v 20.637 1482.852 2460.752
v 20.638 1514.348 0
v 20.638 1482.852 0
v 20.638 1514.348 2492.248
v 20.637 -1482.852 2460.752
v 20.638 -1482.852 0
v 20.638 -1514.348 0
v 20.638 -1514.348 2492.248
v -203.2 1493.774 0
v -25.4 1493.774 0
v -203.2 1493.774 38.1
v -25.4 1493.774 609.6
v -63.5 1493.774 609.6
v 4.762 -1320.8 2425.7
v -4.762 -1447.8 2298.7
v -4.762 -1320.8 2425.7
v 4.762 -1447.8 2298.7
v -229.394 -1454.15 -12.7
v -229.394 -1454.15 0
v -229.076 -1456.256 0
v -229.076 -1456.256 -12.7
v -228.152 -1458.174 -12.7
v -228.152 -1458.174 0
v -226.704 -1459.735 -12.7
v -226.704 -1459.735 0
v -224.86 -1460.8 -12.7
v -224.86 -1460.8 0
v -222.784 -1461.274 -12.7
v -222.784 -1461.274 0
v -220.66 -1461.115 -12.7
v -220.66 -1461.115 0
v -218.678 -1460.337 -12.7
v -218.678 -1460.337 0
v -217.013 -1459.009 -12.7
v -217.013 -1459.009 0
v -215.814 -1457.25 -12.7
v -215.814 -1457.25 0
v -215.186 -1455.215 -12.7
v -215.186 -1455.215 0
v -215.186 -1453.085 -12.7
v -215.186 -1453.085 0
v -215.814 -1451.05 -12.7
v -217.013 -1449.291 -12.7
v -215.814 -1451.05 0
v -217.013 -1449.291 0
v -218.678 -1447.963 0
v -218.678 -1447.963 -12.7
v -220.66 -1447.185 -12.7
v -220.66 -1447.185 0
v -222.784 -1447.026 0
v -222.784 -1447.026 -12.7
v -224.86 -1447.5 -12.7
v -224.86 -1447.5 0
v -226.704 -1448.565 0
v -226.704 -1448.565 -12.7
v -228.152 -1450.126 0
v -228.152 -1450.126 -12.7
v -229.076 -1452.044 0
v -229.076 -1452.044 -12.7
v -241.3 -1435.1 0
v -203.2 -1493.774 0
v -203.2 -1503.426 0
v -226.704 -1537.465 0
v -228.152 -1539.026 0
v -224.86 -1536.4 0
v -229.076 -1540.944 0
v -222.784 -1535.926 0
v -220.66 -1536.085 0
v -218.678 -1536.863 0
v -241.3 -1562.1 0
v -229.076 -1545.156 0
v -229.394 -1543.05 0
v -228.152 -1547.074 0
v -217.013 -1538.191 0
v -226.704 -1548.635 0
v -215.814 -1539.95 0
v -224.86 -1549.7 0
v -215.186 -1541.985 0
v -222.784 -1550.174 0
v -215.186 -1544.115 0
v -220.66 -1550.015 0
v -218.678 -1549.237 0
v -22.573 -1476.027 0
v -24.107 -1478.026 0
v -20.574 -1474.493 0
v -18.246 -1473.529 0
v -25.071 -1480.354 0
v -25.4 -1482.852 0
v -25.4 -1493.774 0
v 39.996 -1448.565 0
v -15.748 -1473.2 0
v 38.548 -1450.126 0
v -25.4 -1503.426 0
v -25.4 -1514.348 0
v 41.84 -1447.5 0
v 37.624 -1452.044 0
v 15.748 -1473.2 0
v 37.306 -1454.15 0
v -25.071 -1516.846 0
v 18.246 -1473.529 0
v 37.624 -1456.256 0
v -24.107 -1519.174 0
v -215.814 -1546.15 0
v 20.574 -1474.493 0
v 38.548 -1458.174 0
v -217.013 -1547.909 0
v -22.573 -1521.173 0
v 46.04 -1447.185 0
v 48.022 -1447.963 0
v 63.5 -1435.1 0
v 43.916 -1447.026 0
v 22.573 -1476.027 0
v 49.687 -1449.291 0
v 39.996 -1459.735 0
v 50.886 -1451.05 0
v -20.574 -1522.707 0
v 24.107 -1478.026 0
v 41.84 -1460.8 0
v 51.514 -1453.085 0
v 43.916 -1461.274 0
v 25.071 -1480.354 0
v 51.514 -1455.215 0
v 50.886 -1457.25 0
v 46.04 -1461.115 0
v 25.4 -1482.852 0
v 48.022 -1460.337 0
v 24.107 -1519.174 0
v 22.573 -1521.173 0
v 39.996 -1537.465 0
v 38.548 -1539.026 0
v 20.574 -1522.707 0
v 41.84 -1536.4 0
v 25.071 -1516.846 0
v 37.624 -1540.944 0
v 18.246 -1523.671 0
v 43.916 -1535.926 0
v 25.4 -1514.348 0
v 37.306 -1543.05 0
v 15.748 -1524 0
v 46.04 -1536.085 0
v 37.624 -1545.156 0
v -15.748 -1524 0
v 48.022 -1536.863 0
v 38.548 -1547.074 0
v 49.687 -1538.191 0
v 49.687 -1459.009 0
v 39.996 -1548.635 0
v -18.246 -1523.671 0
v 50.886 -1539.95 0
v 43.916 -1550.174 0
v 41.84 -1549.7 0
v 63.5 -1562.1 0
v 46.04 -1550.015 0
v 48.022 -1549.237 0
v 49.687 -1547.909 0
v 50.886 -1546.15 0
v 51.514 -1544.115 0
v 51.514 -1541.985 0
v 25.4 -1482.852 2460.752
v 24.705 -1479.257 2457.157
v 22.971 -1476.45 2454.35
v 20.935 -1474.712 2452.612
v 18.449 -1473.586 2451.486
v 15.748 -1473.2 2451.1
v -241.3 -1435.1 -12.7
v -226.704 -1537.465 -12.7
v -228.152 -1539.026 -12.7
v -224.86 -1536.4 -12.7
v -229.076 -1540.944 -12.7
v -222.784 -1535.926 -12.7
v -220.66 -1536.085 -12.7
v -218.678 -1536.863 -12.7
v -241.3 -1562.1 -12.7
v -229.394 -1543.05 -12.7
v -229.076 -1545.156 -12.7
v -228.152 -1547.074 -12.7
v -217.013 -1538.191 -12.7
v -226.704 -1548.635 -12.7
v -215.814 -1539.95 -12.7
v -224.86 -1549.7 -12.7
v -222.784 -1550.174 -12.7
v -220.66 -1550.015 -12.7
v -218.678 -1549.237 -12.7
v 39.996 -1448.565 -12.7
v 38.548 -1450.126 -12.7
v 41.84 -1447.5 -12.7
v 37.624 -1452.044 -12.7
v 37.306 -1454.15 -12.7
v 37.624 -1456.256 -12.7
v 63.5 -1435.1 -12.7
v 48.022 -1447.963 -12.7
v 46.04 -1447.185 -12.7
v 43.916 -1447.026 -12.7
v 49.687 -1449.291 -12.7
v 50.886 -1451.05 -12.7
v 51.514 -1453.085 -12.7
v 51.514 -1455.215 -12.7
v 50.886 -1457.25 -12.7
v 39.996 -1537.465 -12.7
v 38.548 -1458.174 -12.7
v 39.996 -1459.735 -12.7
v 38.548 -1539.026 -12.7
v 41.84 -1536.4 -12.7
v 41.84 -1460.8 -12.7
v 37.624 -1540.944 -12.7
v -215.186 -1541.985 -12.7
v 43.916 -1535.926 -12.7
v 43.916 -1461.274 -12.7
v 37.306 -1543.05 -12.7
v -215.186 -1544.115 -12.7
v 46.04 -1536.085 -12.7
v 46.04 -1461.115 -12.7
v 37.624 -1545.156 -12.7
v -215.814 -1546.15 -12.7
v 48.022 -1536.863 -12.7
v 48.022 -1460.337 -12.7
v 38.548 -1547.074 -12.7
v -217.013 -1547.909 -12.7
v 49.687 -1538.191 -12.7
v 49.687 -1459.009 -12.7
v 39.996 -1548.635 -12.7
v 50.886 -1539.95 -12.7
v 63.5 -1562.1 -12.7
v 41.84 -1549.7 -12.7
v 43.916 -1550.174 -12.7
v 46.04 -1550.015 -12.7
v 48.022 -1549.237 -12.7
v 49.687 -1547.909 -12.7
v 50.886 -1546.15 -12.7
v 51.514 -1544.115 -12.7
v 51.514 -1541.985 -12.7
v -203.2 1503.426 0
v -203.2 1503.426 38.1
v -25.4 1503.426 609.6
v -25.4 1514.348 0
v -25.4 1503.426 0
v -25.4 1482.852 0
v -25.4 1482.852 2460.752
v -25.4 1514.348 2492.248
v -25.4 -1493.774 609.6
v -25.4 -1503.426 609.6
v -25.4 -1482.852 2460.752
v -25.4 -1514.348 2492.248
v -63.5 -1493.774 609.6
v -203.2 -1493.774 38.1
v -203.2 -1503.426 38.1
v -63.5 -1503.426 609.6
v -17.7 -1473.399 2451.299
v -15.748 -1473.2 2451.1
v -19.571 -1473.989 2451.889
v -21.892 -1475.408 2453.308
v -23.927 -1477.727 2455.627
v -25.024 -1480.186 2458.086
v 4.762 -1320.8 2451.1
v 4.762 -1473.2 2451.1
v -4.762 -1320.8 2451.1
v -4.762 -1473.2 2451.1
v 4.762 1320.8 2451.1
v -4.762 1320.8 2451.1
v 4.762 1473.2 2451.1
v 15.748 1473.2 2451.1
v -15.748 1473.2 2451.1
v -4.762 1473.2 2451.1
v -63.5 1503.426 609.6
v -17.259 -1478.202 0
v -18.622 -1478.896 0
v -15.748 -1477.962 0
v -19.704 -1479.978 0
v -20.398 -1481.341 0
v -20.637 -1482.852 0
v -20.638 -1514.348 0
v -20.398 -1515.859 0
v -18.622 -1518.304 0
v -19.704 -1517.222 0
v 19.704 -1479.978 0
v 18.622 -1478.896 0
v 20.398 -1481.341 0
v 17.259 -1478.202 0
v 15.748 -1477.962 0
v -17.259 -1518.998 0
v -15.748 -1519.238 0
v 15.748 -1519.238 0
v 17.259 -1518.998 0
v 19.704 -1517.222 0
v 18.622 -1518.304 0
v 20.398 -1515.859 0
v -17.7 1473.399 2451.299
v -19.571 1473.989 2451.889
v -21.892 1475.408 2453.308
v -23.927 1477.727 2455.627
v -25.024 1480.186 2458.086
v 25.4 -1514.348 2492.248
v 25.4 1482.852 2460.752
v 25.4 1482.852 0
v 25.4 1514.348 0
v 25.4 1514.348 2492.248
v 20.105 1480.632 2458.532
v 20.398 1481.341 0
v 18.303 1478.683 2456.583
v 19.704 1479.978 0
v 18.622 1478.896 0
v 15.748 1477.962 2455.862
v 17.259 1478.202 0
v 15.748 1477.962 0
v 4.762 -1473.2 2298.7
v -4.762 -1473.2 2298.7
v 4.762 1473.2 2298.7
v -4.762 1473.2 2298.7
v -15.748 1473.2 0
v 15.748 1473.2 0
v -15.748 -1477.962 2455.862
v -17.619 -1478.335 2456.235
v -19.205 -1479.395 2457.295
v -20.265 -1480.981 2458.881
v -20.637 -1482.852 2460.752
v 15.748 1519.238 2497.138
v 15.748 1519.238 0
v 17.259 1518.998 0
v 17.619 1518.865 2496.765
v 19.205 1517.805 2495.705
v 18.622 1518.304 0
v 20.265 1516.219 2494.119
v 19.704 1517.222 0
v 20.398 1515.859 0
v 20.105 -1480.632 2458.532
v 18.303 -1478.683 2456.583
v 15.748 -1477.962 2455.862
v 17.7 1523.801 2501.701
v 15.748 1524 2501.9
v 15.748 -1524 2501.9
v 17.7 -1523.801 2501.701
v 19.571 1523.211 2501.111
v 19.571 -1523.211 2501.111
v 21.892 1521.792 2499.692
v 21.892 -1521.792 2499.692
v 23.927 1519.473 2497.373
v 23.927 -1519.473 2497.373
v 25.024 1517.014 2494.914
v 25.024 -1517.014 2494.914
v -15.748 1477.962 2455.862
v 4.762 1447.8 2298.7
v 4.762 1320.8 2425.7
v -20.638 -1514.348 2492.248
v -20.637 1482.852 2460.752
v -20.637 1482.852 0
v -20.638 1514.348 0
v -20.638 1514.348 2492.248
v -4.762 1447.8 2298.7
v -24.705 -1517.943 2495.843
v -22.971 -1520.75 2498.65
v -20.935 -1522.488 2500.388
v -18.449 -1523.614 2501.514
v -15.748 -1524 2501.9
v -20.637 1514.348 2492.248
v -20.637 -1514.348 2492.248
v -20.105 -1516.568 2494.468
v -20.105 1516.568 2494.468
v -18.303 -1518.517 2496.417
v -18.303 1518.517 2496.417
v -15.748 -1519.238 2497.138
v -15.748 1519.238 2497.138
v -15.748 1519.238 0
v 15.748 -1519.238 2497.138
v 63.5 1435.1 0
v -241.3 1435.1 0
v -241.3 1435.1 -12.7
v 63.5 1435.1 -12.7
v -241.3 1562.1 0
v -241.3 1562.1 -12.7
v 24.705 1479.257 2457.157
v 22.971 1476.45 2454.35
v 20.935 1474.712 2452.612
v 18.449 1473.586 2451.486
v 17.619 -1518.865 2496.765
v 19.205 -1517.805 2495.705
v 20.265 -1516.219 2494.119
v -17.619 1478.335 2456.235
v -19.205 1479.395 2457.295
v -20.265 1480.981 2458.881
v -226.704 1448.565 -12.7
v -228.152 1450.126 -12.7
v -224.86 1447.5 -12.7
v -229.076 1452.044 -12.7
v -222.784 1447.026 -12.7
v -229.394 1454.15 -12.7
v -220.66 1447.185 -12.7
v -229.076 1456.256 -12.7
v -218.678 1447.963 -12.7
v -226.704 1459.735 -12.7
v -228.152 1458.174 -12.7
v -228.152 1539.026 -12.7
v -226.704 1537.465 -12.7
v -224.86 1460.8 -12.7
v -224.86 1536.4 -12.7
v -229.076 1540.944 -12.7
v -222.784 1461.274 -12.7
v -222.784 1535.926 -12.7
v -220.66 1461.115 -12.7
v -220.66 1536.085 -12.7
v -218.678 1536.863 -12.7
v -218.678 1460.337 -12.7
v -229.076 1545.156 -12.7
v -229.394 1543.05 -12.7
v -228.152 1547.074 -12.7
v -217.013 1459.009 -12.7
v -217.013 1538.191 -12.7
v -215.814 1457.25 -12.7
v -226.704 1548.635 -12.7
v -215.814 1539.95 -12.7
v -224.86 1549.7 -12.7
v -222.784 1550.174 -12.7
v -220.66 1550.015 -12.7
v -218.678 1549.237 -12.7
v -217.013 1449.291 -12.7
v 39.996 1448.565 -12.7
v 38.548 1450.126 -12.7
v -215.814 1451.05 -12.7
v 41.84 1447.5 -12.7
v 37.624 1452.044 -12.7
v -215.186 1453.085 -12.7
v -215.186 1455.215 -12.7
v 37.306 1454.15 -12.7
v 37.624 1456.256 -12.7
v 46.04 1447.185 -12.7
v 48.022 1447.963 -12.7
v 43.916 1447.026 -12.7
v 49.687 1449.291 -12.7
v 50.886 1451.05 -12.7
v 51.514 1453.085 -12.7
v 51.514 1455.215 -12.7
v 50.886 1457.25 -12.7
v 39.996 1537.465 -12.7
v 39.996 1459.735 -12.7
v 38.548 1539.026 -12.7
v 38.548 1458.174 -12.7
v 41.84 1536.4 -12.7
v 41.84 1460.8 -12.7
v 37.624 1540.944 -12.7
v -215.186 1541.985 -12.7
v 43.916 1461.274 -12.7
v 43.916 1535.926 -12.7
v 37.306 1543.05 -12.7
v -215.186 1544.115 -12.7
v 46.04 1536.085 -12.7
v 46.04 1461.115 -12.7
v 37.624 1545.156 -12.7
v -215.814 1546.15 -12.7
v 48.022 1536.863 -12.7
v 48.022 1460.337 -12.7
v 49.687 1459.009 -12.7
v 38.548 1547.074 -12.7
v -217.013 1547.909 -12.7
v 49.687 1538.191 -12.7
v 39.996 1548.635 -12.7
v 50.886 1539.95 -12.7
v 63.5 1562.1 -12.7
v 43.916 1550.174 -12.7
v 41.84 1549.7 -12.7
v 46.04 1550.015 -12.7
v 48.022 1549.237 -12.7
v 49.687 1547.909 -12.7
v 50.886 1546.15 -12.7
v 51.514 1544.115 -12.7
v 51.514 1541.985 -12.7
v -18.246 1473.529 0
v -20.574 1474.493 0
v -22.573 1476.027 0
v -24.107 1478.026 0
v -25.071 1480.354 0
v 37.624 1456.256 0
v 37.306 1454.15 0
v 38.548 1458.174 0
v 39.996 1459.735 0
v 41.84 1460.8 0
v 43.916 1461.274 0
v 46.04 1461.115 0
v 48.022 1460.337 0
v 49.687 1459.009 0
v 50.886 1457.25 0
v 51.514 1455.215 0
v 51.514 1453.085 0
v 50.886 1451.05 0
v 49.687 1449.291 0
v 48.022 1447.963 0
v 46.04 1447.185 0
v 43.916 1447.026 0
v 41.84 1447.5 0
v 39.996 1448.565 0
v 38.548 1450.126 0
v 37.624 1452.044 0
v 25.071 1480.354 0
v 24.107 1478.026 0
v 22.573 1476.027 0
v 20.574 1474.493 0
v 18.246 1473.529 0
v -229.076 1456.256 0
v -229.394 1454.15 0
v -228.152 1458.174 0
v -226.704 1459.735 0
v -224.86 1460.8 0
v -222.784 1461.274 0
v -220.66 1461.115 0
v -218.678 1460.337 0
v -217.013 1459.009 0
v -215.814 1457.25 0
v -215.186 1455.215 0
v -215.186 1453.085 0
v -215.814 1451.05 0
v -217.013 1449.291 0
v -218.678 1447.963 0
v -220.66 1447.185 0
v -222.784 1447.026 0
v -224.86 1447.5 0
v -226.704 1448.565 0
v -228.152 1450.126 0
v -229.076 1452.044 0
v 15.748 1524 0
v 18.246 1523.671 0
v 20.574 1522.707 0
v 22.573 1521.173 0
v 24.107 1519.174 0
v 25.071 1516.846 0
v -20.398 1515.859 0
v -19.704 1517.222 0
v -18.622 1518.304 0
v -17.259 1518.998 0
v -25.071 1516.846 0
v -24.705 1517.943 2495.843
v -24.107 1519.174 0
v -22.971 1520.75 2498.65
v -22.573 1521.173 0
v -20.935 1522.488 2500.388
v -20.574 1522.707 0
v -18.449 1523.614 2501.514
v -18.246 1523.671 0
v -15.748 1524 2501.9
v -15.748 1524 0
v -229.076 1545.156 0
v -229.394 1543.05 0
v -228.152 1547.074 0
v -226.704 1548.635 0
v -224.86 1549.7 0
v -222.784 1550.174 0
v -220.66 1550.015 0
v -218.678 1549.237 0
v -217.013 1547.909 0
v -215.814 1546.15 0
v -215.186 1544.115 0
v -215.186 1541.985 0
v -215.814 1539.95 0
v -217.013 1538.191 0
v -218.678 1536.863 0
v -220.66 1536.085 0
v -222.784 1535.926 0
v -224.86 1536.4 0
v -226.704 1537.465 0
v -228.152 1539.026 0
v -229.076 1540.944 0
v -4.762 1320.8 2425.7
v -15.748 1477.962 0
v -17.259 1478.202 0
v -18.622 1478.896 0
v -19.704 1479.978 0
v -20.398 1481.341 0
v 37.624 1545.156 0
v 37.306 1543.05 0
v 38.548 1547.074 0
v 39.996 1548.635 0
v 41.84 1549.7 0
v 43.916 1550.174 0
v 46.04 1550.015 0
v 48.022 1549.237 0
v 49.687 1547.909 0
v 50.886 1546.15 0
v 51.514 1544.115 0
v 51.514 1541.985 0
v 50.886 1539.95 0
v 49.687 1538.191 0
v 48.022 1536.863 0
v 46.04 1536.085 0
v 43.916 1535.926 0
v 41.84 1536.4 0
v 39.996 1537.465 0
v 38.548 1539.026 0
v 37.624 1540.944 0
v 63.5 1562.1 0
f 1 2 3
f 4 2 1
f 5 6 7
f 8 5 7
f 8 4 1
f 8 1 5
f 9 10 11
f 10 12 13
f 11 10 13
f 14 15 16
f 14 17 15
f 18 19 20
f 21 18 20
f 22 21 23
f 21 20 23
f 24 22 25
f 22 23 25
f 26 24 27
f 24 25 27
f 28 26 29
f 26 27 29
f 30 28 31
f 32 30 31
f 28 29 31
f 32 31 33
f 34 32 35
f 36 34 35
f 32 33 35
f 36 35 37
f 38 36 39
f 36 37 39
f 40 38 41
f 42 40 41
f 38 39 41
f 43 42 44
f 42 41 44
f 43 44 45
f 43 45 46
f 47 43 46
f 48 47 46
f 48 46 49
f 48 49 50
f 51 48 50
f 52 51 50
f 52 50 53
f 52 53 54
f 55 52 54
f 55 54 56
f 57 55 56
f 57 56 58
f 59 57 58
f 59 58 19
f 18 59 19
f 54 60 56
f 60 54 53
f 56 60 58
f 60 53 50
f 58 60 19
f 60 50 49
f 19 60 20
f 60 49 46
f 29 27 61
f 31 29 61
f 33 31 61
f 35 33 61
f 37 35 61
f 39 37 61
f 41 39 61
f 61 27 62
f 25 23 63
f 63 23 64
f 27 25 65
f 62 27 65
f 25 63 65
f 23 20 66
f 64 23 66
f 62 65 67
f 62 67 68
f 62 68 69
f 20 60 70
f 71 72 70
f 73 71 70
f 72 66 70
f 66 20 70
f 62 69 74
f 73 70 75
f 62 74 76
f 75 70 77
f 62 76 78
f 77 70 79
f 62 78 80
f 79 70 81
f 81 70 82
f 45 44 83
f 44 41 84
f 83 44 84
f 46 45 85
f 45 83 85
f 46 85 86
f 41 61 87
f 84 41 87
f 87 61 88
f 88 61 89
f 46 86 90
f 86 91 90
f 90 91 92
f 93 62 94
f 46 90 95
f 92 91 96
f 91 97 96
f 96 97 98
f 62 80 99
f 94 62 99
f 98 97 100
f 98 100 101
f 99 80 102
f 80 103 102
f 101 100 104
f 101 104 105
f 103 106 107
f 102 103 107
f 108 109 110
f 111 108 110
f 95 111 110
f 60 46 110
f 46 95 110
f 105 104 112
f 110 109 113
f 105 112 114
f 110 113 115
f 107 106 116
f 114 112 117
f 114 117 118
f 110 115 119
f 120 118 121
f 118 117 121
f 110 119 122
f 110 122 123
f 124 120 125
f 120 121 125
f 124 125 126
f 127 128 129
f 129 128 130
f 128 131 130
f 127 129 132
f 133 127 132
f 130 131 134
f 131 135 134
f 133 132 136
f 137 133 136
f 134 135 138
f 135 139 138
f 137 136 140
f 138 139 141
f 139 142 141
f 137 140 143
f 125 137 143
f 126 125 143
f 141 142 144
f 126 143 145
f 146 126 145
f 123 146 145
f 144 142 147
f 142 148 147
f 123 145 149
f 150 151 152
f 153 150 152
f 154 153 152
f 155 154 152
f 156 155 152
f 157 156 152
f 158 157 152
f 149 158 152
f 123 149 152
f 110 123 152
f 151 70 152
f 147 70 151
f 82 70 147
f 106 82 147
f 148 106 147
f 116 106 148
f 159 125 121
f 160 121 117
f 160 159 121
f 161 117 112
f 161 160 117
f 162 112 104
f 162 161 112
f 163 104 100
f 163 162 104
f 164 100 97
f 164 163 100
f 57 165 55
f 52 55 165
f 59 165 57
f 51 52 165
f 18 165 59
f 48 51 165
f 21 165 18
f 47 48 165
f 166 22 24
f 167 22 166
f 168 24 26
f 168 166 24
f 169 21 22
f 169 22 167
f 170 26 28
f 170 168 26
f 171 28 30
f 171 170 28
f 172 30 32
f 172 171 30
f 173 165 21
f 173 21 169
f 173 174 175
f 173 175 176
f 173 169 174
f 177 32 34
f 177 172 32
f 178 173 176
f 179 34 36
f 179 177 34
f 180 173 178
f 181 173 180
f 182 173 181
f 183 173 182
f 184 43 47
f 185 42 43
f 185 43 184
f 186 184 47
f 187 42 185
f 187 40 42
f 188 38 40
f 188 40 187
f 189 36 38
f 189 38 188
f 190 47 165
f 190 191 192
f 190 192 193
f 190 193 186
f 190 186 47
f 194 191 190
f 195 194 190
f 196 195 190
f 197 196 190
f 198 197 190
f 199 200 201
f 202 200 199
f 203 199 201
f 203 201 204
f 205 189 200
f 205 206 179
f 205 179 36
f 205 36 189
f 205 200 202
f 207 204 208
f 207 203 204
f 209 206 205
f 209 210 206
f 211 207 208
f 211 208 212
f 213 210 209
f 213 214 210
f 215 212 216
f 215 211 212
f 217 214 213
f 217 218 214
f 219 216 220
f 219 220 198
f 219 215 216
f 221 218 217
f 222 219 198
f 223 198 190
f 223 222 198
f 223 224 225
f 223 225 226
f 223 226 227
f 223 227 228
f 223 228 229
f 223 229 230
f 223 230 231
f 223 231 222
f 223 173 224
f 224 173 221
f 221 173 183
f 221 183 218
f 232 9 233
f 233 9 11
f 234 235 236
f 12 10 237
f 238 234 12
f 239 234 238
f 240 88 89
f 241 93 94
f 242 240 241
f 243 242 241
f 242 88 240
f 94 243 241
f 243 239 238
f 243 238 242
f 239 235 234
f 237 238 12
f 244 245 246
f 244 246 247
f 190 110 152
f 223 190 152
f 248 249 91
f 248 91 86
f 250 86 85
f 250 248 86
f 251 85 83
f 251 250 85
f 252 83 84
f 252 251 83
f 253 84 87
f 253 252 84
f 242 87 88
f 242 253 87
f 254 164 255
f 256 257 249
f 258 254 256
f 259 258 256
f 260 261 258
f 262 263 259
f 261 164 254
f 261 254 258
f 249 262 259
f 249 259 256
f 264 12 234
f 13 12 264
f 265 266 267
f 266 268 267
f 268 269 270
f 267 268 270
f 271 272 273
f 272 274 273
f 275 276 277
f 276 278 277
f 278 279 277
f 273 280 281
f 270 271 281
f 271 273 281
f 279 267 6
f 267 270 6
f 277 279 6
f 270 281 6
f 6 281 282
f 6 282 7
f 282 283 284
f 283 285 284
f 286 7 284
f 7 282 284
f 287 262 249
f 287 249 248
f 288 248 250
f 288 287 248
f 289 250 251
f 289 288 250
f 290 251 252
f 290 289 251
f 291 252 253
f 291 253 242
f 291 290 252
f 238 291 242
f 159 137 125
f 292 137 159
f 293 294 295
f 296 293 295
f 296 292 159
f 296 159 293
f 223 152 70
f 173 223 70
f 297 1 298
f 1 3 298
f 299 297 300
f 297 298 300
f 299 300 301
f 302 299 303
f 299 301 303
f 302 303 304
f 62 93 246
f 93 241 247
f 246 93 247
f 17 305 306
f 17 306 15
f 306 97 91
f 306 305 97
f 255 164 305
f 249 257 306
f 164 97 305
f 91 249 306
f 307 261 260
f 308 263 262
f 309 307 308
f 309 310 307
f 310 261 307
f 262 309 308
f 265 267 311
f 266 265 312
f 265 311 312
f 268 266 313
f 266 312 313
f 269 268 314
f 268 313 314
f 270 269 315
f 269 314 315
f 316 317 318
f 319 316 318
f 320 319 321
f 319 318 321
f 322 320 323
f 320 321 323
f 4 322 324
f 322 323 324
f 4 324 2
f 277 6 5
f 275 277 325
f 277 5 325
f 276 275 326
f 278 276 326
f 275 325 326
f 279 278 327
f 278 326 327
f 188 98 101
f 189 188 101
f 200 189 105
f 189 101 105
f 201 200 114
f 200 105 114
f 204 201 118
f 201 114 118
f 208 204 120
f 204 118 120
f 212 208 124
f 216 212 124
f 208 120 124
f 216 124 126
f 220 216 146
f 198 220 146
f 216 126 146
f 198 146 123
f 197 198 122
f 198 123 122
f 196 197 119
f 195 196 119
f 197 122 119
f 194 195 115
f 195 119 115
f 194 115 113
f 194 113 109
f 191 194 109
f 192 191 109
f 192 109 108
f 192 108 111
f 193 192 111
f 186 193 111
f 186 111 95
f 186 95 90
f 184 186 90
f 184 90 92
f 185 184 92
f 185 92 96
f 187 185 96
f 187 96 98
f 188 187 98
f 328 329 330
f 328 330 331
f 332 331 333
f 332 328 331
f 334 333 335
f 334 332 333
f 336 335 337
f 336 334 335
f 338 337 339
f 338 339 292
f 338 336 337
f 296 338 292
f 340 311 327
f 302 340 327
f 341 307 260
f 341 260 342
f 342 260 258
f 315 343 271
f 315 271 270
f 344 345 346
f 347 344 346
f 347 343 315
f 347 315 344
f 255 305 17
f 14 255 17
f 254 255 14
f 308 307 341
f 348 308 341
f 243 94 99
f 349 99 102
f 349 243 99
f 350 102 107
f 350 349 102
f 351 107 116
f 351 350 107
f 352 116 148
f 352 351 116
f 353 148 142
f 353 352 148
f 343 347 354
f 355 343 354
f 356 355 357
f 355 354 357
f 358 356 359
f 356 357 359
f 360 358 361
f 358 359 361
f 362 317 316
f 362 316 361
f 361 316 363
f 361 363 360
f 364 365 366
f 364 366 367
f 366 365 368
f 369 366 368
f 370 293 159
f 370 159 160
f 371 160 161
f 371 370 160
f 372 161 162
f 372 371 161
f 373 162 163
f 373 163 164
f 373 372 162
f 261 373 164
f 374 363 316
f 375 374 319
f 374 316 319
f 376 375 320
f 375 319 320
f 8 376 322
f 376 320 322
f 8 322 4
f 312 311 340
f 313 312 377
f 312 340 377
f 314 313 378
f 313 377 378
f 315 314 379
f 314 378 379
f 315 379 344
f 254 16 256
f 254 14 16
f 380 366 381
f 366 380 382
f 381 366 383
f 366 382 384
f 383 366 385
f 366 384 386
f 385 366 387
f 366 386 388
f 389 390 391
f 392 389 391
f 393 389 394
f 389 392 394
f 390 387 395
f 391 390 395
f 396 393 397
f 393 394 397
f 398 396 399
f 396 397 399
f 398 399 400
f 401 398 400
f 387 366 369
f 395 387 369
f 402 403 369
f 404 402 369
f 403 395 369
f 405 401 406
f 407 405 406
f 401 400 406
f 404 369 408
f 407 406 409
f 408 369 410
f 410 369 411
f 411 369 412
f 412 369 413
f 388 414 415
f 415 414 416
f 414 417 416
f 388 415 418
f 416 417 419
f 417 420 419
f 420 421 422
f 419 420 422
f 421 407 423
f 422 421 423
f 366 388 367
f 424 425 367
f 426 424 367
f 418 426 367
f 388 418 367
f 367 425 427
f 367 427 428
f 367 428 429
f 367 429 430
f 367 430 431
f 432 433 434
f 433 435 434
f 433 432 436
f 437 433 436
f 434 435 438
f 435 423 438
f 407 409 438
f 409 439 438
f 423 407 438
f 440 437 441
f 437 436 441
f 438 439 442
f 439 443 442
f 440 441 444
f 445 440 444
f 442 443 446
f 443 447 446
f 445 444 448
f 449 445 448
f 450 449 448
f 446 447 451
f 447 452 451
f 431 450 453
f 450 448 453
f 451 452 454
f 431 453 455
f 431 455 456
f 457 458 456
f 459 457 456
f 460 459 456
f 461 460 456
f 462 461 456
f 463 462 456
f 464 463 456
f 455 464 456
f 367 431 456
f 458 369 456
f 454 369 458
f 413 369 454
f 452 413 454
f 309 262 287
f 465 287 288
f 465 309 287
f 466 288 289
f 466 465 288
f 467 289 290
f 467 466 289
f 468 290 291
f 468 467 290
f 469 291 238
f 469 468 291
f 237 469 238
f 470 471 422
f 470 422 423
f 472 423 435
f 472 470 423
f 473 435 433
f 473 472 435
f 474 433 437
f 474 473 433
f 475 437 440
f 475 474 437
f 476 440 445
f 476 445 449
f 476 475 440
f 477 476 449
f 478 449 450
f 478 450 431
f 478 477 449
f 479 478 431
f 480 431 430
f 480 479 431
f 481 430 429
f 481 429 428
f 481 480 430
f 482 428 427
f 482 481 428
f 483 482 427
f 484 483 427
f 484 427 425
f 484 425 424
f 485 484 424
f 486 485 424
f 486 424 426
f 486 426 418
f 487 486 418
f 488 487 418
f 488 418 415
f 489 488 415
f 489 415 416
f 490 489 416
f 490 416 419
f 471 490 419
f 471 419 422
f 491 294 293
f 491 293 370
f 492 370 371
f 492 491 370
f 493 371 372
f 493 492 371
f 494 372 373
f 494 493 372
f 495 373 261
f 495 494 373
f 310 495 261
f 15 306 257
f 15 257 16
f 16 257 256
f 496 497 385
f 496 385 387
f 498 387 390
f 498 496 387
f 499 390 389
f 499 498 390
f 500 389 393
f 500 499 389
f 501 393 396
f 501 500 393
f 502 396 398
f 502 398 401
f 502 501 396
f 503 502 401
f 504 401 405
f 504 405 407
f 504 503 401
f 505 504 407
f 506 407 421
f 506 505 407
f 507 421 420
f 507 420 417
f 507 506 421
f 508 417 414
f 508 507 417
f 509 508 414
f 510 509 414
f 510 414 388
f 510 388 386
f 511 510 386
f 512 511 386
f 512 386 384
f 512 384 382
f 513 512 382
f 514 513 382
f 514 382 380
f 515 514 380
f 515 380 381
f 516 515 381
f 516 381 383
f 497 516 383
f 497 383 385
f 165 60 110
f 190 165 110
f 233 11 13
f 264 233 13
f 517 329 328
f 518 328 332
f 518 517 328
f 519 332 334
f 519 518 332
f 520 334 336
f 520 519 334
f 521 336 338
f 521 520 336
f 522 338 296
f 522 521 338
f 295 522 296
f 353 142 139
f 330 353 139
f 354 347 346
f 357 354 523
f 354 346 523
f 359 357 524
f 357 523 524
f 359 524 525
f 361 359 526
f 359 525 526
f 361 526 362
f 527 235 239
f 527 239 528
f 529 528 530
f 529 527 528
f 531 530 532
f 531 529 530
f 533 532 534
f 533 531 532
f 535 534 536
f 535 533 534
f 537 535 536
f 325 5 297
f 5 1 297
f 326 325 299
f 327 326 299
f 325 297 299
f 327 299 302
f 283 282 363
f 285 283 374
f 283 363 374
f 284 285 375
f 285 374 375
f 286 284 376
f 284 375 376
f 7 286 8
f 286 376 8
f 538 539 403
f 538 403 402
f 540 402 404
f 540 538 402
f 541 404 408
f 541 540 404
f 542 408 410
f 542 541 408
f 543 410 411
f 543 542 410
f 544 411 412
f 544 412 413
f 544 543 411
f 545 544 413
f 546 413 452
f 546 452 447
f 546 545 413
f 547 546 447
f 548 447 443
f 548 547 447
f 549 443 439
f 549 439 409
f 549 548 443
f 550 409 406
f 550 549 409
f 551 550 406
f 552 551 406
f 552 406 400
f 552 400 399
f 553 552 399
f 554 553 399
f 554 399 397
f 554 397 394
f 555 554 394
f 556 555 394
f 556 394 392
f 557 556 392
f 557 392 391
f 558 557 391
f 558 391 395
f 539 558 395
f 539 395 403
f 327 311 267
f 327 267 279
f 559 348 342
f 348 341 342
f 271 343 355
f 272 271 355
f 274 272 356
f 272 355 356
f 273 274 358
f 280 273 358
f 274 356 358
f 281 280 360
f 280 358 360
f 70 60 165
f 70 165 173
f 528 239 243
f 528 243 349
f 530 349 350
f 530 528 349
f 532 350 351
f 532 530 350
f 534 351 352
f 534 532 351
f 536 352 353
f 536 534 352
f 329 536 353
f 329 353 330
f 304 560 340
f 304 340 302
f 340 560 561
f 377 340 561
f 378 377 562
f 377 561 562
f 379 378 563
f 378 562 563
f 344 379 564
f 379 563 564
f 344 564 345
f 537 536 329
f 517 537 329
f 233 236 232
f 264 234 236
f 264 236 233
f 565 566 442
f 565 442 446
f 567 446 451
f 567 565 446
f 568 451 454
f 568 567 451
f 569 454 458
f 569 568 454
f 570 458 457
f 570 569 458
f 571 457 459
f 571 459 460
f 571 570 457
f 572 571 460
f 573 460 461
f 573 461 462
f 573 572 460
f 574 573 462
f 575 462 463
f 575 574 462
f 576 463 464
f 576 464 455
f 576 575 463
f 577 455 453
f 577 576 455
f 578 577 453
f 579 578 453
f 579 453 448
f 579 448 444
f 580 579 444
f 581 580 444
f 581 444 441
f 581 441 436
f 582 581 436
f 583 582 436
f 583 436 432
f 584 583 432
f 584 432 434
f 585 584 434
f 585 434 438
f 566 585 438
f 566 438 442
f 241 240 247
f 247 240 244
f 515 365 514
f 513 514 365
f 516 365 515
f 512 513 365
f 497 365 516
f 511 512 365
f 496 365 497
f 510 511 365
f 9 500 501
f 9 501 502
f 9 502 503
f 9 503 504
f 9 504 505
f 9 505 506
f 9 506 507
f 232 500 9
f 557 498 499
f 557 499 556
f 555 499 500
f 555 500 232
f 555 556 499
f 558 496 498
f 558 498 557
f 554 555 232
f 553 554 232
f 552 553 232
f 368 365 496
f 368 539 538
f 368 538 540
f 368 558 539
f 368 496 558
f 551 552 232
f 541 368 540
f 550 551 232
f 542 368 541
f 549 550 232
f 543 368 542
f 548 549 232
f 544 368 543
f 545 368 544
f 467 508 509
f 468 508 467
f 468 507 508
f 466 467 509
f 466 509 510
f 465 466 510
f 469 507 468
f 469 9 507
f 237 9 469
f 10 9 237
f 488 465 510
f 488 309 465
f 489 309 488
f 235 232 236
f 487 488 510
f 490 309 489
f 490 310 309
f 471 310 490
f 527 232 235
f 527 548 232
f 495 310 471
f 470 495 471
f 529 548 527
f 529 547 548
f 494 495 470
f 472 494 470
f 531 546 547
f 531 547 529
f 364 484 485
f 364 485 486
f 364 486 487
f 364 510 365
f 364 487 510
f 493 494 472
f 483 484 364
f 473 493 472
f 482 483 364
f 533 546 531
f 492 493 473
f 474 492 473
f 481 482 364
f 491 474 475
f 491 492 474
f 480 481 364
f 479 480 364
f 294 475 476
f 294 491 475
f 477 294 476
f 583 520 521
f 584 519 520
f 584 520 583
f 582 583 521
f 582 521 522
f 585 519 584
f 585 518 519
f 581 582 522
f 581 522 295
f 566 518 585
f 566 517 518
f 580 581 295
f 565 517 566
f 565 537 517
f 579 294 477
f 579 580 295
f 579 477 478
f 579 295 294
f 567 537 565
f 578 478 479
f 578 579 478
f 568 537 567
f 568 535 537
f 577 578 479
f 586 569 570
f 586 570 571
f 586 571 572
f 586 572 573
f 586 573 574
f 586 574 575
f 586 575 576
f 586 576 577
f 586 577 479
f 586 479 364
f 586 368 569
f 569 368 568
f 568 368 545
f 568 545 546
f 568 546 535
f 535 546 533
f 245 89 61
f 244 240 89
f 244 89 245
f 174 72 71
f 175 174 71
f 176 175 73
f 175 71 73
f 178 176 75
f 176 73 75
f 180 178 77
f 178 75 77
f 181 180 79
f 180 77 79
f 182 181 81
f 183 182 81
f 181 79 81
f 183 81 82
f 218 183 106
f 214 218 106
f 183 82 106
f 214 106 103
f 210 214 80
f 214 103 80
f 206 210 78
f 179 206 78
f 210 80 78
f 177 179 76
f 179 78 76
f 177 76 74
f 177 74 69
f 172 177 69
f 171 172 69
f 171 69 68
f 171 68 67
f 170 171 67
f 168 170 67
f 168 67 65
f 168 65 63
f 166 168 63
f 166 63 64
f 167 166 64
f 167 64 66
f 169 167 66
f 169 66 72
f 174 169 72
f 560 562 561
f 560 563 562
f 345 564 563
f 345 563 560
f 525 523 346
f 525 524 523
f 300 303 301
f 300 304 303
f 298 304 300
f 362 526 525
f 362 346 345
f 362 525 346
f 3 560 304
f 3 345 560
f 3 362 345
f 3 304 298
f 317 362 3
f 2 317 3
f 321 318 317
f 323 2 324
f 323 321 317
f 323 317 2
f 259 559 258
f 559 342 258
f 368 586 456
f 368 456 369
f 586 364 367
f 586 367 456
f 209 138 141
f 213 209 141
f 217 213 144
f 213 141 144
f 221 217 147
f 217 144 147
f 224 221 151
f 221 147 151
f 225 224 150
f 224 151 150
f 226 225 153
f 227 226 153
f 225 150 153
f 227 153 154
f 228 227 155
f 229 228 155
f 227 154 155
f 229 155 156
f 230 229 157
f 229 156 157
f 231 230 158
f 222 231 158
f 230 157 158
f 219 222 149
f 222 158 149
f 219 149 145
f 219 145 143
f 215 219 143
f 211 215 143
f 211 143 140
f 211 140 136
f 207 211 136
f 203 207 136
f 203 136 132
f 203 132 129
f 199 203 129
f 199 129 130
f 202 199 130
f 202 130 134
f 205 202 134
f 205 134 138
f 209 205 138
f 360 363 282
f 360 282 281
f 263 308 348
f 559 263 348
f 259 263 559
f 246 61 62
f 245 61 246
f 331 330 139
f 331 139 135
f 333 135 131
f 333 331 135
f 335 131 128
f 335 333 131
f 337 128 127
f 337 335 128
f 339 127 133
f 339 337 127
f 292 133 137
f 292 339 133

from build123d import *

# Parameters (mm, degrees)
F3_W      = 127
F3_H      = 127
F3_W_2    = 177.8
F4_DEPTH  = 12.7
F6_W      = 38.1
F6_H      = 38.1
F6_W_2    = 139.7
F6_H_2    = 571.5
F7_DEPTH  = 4.826
F9_D      = 14.2875
F13_DEPTH = 4.7625


# Not quite as in the source:
# - a length typed as a fraction of an inch, garbled in the dataset ("3 / 203.2 mm" for 3/8 in), is restored


with BuildPart() as f2:
    # F2: sweep along a path in F0
    with BuildLine(Plane.YZ) as f2_path:
        Line((-1524, 0), (-1524, 2501.9))
        Line((-1524, 2501.9), (1524, 2501.9))
        Line((1524, 2501.9), (1524, 0))
    # F1 (on Top) → F2 (sweep)
    with BuildSketch(Plane.XY):
        with BuildLine():
            Line((-15.748, -1524), (0, -1524))
            Line((0, -1524), (15.748, -1524))
            ThreePointArc((15.748, -1524), (22.572994652, -1521.172994652), (25.4, -1514.348))
            Line((25.4, -1514.348), (25.4, -1482.852))
            ThreePointArc((25.4, -1482.852), (22.572994652, -1476.027005348), (15.748, -1473.2))
            Line((15.748, -1473.2), (-15.748, -1473.2))
            ThreePointArc((-15.748, -1473.2), (-22.572994652, -1476.027005348), (-25.4, -1482.852))
            Line((-25.4, -1482.852), (-25.4, -1514.348))
            ThreePointArc((-25.4, -1514.348), (-22.572994652, -1521.172994652), (-15.748, -1524))
        make_face()
        with BuildLine():
            Line((0, -1519.2375), (-15.748, -1519.2375))
            ThreePointArc((-15.748, -1519.2375), (-19.2053986066, -1517.8053986066), (-20.6375, -1514.348))
            Line((-20.6375, -1514.348), (-20.6375, -1482.852))
            ThreePointArc((-20.6375, -1482.852), (-19.2053986066, -1479.3946013934), (-15.748, -1477.9625))
            Line((-15.748, -1477.9625), (15.748, -1477.9625))
            ThreePointArc((15.748, -1477.9625), (19.2053986066, -1479.3946013934), (20.6375, -1482.852))
            Line((20.6375, -1482.852), (20.6375, -1514.348))
            ThreePointArc((20.6375, -1514.348), (19.2053986066, -1517.8053986066), (15.748, -1519.2375))
            Line((15.748, -1519.2375), (0, -1519.2375))
        make_face(mode=Mode.SUBTRACT)
    sweep(path=f2_path.line, transition=Transition.RIGHT)

    # F3 (on face) → F4 (join)
    with BuildSketch(Plane(origin=(0, 0, 0), x_dir=(1, 0, 0), z_dir=(0, 0, -1))):
        with Locations((0, 1498.6)):
            Rectangle(F3_W, F3_H)
        with Locations((-152.4, 1498.6)):
            Rectangle(F3_W_2, F3_H)
    extrude(amount=F4_DEPTH)

    # F6 (on mid) → F7 (join, symmetric)
    with BuildSketch(Plane(origin=(0, -1498.6, 0), x_dir=(-1, 0, 0), z_dir=(0, 1, 0))):
        with Locations((44.45, 19.05)):
            Rectangle(F6_W, F6_H)
        with Locations((133.35, 19.05)):
            Rectangle(F6_W_2, F6_H)
        with Locations((44.45, 323.85)):
            Rectangle(F6_W, F6_H_2)
        Polygon((63.5, 609.6), (63.5, 38.1), (203.2, 38.1), align=None)
    extrude(amount=F7_DEPTH, both=True)

    # F9 (through all)
    with Locations(Plane(origin=(0, 0, -12.7), x_dir=(1, 0, 0), z_dir=(0, 0, -1))):
        with Locations((-222.25, 1454.15), (-222.25, 1543.05), (44.45, 1543.05), (44.45, 1454.15)):
            Hole(F9_D / 2)

    # F10: F2 across plane


with BuildPart() as f2_1:
    add(f2.part)
    add(f2.part.mirror(Plane.XZ))

    # F12 (on mid) → F13 (join, symmetric)
    with BuildSketch(Plane.YZ):
        Polygon((-1320.8, 2451.1), (-1473.2, 2451.1), (-1473.2, 2298.7), (-1447.8, 2298.7), (-1320.8, 2425.7), align=None)
    extrude(amount=F13_DEPTH, both=True)

    # F14: F2 across plane


with BuildPart() as f2_2:
    add(f2_1.part)
    add(f2_1.part.mirror(Plane.XZ))


solid = f2_2.part
